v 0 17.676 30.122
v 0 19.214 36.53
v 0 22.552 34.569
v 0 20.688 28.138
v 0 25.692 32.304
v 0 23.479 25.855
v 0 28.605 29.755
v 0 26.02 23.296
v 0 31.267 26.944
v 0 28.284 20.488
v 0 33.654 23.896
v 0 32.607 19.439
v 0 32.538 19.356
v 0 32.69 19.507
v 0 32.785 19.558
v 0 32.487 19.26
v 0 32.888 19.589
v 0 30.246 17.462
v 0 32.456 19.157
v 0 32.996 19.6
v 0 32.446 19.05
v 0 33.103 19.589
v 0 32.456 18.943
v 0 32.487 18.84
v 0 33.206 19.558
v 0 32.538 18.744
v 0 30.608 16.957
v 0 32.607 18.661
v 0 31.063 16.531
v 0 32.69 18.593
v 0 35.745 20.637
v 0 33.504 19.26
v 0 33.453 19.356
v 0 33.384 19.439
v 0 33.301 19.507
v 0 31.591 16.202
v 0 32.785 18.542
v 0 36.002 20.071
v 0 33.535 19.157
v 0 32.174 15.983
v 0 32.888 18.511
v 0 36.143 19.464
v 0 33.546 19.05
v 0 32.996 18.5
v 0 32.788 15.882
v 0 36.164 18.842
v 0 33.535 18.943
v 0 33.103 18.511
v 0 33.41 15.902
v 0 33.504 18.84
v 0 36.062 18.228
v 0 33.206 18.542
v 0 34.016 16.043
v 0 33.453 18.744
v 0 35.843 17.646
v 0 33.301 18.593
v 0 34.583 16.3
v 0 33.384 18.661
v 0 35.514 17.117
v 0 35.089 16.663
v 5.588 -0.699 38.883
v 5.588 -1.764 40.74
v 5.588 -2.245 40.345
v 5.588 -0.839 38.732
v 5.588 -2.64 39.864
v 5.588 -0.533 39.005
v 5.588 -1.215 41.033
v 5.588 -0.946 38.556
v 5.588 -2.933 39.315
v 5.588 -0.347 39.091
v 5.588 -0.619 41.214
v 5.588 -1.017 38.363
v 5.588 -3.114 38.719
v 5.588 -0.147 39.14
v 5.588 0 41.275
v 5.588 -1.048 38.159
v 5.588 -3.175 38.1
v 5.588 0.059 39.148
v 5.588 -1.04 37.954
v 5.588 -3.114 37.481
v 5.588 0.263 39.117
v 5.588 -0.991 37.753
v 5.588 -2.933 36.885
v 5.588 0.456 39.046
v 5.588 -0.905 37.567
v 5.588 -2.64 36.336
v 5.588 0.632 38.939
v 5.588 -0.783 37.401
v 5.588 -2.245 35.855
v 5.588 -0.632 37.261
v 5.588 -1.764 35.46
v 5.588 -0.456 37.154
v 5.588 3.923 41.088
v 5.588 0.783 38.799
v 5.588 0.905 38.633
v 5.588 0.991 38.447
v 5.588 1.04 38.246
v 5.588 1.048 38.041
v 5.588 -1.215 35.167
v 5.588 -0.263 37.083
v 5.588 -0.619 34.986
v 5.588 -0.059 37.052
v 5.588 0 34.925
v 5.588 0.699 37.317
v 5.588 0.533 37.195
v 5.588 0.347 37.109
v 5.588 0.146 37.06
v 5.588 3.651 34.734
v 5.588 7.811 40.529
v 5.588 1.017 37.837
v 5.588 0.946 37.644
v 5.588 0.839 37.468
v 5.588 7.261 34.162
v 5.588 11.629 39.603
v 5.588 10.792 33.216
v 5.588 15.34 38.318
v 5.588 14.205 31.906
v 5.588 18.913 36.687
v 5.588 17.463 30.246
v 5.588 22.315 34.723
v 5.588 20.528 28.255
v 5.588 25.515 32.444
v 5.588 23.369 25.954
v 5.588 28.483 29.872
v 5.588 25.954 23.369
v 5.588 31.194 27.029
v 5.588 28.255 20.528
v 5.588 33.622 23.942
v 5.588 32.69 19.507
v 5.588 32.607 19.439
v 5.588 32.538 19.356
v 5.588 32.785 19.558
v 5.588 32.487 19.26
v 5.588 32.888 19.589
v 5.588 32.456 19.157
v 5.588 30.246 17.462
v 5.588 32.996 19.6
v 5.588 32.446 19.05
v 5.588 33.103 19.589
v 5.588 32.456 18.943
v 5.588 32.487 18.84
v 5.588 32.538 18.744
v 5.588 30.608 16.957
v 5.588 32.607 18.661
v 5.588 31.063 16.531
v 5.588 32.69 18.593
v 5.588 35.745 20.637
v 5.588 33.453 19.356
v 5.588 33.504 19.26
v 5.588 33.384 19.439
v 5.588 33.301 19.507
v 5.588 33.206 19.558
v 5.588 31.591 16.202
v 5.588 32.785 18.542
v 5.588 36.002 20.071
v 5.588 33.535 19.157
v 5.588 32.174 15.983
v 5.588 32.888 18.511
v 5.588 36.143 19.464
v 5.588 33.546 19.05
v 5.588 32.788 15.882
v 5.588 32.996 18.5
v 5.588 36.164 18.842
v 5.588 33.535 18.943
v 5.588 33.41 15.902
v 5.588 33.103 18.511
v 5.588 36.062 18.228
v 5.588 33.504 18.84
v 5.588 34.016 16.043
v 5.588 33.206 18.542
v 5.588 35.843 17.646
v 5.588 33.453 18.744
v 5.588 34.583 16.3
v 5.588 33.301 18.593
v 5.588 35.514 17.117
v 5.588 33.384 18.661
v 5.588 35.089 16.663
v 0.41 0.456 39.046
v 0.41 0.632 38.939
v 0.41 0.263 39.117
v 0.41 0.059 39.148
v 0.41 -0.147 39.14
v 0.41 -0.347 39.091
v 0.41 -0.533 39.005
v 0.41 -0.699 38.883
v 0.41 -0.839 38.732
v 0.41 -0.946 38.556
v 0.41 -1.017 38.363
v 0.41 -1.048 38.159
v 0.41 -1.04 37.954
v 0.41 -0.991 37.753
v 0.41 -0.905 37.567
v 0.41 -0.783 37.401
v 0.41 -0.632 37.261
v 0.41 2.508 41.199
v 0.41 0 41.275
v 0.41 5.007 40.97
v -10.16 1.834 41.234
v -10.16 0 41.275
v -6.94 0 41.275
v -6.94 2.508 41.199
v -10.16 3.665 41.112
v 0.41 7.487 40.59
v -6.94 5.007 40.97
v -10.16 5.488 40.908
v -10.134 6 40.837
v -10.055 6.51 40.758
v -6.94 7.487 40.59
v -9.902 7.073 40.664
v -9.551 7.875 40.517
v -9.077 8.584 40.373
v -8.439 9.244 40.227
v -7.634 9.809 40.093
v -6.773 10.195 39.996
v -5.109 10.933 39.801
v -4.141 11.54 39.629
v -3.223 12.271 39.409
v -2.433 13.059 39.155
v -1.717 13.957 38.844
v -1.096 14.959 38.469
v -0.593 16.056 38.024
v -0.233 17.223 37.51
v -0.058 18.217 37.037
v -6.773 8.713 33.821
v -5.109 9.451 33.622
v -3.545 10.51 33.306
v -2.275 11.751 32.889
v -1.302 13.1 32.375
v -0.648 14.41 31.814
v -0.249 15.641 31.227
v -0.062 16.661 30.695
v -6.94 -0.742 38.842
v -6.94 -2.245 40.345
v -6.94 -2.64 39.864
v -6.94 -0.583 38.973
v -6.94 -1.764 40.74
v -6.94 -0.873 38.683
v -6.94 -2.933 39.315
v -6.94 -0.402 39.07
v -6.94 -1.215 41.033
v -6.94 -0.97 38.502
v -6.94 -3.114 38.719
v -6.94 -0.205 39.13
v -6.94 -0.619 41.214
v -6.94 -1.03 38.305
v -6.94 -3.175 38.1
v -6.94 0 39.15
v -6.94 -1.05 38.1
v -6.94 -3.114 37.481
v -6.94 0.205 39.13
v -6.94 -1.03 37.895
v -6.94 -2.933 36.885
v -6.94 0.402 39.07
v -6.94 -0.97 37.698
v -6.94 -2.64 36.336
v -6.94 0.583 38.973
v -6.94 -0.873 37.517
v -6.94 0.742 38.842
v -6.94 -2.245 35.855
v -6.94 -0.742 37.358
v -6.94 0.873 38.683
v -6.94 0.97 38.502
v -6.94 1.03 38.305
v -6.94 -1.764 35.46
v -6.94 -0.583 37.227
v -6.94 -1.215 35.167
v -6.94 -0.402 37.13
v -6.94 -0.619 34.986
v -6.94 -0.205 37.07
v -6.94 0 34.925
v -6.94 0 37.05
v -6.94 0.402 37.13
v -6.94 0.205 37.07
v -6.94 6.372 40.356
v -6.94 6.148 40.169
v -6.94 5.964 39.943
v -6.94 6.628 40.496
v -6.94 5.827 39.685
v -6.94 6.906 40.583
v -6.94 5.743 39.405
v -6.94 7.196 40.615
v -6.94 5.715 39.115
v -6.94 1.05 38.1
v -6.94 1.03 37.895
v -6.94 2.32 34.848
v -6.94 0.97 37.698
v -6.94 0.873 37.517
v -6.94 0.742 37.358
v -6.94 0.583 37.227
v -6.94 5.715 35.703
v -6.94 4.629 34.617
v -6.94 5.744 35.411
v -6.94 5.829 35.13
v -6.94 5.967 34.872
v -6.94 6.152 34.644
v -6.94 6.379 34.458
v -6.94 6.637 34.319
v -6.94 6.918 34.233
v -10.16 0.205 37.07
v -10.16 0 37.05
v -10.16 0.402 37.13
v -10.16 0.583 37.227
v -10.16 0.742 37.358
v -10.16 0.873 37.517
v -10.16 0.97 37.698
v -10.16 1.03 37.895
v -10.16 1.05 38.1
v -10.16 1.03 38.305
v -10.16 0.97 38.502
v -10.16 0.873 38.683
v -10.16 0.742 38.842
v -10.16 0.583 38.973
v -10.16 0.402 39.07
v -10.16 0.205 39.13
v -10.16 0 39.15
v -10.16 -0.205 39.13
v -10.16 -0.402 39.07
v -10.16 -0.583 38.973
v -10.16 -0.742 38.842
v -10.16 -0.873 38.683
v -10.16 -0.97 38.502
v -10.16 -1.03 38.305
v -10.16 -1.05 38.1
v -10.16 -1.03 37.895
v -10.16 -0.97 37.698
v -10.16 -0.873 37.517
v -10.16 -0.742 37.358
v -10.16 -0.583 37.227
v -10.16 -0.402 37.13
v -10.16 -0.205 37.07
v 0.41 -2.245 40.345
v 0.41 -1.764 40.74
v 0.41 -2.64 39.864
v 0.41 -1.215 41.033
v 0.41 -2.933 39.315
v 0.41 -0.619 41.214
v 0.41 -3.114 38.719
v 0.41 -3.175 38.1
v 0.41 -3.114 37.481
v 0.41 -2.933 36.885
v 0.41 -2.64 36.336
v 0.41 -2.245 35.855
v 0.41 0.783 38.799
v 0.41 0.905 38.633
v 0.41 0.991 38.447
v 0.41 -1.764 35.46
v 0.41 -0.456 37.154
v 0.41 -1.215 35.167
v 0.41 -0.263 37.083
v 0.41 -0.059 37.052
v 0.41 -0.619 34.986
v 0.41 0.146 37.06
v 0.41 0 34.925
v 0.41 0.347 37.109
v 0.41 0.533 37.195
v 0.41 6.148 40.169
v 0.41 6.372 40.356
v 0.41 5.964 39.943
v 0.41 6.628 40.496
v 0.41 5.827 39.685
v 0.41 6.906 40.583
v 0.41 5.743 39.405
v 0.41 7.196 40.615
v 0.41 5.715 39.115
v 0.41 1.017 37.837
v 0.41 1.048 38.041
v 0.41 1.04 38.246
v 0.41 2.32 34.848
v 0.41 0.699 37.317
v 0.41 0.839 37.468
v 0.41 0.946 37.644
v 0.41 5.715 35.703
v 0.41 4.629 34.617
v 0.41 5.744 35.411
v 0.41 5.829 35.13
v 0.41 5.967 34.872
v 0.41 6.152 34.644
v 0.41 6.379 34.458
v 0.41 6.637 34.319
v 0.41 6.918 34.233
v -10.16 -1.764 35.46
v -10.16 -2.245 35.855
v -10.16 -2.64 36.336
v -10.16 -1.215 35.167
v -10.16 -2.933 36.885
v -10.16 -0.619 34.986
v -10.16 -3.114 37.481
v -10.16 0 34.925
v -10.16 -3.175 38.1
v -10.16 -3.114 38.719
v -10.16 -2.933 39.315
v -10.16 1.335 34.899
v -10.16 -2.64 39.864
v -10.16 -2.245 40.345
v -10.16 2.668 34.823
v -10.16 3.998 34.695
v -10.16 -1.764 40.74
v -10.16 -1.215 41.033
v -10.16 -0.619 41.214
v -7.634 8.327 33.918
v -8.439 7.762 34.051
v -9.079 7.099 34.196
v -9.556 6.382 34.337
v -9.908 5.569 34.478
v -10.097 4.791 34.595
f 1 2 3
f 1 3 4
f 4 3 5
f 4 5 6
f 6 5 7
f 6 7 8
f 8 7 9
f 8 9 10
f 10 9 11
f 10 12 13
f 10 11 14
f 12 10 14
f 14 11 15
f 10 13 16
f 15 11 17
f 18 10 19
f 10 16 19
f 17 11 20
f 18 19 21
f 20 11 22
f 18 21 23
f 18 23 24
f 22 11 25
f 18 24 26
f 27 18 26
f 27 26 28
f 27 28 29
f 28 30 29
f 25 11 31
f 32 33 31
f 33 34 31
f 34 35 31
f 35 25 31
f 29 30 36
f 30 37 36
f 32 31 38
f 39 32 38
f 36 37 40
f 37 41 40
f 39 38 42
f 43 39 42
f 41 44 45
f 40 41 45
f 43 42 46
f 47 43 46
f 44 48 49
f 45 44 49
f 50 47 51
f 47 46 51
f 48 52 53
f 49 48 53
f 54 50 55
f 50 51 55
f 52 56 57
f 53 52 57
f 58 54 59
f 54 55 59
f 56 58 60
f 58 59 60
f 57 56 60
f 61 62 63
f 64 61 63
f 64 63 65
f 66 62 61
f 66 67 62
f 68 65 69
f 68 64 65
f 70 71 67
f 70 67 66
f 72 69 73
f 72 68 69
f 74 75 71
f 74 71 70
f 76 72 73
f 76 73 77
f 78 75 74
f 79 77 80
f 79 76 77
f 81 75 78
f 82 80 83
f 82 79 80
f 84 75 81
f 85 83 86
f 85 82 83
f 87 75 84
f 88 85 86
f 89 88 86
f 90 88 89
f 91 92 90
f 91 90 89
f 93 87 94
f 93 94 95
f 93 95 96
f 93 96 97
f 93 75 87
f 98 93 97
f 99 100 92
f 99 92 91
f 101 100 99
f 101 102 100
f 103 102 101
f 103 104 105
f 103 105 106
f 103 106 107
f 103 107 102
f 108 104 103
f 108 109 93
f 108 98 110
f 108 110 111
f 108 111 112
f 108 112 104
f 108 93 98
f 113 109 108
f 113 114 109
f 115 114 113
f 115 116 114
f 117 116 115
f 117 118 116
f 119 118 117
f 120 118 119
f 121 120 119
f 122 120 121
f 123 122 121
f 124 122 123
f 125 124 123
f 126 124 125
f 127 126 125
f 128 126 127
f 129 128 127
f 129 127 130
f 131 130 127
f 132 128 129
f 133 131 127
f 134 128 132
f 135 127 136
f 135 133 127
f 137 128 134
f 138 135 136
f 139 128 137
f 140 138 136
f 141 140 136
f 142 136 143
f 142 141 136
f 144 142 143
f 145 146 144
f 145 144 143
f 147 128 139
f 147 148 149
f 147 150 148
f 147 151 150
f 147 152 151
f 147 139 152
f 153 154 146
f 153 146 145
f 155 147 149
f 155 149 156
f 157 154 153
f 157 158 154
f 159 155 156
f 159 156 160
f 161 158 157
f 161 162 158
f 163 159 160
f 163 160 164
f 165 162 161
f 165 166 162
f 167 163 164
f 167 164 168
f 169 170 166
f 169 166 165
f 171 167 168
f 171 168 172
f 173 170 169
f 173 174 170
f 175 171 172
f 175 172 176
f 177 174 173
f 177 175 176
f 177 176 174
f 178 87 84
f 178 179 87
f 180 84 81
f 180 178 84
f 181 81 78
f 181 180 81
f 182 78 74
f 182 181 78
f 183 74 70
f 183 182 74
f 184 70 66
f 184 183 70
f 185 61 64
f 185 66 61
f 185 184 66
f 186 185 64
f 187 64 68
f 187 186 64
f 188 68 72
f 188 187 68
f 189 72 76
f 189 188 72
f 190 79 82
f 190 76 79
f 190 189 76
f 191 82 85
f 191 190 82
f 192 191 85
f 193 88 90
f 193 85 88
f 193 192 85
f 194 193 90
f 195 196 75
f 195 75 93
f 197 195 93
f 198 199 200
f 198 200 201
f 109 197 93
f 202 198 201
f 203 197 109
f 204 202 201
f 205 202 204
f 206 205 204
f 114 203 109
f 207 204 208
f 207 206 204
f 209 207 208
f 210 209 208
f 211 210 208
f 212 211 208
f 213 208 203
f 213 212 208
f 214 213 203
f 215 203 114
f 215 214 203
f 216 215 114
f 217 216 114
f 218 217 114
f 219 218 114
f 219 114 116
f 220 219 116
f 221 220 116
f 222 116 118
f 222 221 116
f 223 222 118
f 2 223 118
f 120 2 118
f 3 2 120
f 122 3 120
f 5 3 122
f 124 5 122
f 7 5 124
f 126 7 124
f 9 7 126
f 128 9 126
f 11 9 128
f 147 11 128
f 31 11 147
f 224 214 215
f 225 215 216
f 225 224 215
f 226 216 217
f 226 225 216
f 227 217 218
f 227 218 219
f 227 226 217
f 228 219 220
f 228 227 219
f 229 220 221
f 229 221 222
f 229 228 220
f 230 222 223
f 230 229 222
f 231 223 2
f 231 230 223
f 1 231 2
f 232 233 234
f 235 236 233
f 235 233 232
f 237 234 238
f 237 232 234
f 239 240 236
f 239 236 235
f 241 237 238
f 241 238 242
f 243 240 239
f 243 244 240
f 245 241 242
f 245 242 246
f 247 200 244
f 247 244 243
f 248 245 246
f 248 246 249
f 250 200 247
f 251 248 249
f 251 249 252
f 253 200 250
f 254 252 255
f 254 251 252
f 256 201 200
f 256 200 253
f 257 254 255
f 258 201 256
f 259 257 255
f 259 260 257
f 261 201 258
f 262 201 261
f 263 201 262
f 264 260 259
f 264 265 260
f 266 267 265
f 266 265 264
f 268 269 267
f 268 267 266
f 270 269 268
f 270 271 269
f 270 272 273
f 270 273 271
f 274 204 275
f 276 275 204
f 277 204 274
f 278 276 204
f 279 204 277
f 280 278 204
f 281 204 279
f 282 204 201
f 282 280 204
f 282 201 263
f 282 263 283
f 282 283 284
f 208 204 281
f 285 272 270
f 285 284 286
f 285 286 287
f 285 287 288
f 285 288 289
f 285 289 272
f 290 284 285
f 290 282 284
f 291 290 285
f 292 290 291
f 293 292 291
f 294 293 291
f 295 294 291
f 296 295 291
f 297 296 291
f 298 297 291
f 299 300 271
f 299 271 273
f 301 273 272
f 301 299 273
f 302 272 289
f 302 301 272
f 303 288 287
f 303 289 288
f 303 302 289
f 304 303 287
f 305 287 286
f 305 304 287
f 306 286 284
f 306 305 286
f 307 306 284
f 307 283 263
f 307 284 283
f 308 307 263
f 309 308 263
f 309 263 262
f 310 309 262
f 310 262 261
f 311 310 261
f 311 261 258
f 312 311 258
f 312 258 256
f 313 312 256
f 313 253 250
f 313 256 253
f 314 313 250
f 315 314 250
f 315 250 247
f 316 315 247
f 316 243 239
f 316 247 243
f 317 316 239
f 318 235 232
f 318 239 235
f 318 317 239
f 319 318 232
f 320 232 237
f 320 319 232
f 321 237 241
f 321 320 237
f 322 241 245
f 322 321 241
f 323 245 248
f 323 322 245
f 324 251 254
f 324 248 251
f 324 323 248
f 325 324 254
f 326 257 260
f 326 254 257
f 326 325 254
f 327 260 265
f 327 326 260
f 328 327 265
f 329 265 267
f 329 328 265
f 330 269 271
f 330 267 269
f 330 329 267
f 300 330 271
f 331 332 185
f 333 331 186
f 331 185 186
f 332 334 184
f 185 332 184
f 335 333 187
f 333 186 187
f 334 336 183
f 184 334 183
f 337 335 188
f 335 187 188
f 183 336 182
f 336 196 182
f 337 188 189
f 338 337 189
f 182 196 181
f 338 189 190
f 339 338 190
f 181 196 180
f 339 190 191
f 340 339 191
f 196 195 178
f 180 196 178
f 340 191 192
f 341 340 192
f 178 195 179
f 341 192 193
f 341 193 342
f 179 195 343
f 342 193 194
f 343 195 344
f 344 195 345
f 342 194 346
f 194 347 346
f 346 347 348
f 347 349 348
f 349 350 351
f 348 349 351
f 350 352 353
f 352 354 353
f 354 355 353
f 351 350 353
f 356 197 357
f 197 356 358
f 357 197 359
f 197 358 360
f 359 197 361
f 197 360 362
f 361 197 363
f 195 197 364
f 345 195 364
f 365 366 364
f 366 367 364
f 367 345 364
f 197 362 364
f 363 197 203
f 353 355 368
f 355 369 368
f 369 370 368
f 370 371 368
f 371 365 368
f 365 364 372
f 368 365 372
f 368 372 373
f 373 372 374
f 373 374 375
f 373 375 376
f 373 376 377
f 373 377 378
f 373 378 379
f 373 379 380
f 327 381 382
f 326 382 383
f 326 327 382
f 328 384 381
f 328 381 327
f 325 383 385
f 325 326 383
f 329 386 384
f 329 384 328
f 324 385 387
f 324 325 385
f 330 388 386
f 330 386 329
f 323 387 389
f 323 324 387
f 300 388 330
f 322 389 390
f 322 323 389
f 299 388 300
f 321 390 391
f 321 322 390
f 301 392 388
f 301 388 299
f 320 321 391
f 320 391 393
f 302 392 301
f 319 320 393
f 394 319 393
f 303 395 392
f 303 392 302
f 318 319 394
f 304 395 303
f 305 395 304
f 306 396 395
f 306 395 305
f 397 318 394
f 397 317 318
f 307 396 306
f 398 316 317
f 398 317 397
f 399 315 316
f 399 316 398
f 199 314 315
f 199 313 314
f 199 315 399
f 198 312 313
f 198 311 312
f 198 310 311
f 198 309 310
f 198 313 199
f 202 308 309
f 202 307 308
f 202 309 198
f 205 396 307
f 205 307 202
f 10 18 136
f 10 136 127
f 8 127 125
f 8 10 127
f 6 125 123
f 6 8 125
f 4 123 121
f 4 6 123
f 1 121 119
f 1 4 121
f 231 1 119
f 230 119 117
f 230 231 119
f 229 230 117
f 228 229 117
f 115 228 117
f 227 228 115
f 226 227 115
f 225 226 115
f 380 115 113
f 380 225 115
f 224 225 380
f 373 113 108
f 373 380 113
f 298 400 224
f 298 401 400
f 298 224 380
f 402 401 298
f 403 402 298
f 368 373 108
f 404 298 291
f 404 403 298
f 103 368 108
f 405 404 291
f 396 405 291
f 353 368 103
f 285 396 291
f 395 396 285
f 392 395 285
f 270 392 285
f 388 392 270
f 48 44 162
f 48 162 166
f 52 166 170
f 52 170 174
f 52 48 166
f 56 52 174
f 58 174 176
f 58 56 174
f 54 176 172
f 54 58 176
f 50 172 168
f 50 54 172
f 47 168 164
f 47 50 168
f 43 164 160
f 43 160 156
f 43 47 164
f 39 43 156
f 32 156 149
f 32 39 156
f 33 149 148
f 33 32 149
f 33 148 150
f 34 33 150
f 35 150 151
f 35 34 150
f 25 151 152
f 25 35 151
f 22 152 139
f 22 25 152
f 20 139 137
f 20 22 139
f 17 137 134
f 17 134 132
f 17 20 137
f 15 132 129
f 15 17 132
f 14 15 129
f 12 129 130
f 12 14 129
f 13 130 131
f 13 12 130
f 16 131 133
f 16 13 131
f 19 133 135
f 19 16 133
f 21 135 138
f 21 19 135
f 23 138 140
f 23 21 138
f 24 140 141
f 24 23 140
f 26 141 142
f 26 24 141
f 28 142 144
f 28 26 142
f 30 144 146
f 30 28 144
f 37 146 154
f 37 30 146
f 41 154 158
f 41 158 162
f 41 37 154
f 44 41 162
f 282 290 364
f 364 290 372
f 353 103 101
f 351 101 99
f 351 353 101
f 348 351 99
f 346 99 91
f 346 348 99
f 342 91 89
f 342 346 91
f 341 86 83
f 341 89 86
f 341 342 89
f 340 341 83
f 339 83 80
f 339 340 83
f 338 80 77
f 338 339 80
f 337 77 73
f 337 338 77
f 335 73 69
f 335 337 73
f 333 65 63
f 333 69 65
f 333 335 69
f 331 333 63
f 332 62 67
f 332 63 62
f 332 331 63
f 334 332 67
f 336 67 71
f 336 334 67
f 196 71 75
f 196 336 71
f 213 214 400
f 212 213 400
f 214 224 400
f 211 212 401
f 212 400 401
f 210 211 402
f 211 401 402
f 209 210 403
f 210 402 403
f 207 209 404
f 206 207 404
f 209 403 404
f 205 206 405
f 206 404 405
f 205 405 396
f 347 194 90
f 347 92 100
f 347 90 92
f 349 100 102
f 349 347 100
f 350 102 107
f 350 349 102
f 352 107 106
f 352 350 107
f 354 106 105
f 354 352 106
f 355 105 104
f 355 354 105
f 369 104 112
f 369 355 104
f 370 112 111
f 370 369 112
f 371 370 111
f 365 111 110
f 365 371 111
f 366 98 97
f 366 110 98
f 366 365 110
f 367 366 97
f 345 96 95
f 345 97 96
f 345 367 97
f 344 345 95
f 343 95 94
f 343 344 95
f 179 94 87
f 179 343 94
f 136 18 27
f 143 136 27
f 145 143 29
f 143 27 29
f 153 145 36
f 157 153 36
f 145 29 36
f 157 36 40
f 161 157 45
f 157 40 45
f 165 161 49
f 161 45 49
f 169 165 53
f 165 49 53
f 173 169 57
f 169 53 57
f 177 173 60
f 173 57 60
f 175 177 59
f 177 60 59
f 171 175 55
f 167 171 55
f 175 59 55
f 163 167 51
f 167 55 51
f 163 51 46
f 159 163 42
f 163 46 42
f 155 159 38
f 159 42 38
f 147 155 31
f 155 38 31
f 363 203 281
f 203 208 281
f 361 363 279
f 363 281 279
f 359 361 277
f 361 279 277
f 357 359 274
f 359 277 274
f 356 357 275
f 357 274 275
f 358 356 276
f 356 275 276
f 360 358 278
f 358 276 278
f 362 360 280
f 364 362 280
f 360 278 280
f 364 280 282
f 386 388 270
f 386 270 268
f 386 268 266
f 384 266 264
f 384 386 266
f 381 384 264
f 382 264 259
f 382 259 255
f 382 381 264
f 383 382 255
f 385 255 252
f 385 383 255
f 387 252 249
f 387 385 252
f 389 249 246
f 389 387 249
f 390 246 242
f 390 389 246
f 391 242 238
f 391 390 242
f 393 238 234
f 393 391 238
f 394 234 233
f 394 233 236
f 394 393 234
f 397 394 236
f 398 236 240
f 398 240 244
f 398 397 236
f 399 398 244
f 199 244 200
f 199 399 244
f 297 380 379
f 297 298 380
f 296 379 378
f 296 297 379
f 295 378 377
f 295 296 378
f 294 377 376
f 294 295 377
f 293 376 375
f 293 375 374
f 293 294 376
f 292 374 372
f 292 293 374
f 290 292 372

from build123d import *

# Parameters (mm, degrees)
ESQUISSE1_R                  = 1.050000000000002
ESQUISSE1_R_2                = 0.5500000000000002
BOSS_EXTRU_1_DEPTH           = 5.588
BOSS_EXTRU_2_START           = 10.16
BOSS_EXTRU_2_DEPTH           = 10.16
ESQUISSE3_W                  = 7.349999
ESQUISSE3_H                  = 12.302264747859223
ENL_V_MAT_EXTRU_1_DEPTH      = 5.715
CONG_1_R                     = 10.16
CONG_2_R                     = 5.08
ENL_V_MAT_EXTRU_2_DEPTH      = 58.09584154270072
ENL_V_MAT_EXTRU_2_DEPTH_BACK = 58.09584154270072
ESQUISSE4_R                  = 1.050000000000002
CONG_3_R                     = 1.5


with BuildPart() as part:
    # Esquisse1 → Boss.-Extru.1 (new body)
    with BuildSketch(Plane(origin=(0, 0, 0), x_dir=(0, 0, -1), z_dir=(1, 0, 0))):
        with BuildLine():
            ThreePointArc((-34.925000000000004, 0), (-30.245937227171517, 17.462500000000013), (-17.4625, 30.245937227171524))
            ThreePointArc((-17.4625, 30.245937227171524), (-16.300369342984403, 34.583067884187116), (-20.637499999999996, 35.745198541202704))
            ThreePointArc((-20.637499999999996, 35.745198541202704), (-35.7451985412027, 20.637500000000014), (-41.275, 0))
            ThreePointArc((-41.275, 0), (-38.1, -3.174999999999997), (-34.925000000000004, 0))
        make_face()
        with Locations((-38.1, 0)):
            Circle(ESQUISSE1_R, mode=Mode.SUBTRACT)
        with Locations((-19.049999999999997, 32.99556788418712)):
            Circle(ESQUISSE1_R_2, mode=Mode.SUBTRACT)
    extrude(amount=BOSS_EXTRU_1_DEPTH)

    # Esquisse2 → Boss.-Extru.2 (add)
    with BuildSketch(Plane.ZY.offset(BOSS_EXTRU_2_START)):
        with BuildLine():
            Line((40.13567832123378, 9.630833333333326), (33.96095857950552, 8.14916666666666))
            ThreePointArc((33.96095857950552, 8.14916666666666), (34.68315227447781, 4.10299565017866), (34.925000000000004, 0))
            ThreePointArc((34.925000000000004, 0), (38.1, -3.174999999999997), (41.275, 0))
            ThreePointArc((41.275, 0), (40.9891799607465, 4.848994859302054), (40.13567832123378, 9.630833333333326))
        make_face()
    extrude(amount=-BOSS_EXTRU_2_DEPTH)

    # Esquisse3 → Enlèv. mat.-Extru.1 (cut, symmetric)
    with BuildSketch(Plane(origin=(0, 0, 0), x_dir=(1, 0, 0), z_dir=(0, 1, 0))):
        with Locations((-3.2647804999577055, -37.13499681447274)):
            Rectangle(ESQUISSE3_W, ESQUISSE3_H)
    extrude(amount=ENL_V_MAT_EXTRU_1_DEPTH, both=True, mode=Mode.SUBTRACT)

    # Congé1
    cong_1_edges = [part.edges().sort_by_distance(p)[0] for p in [
        (0, 8.889999999999993, 37.04831845036965),
    ]]
    fillet(cong_1_edges, radius=CONG_1_R - 0.0001)  # a hair under: the kernel refuses the full size

    # Congé2
    cong_2_edges = [part.edges().sort_by_distance(p)[0] for p in [
        (-10.16, 8.889999999999993, 37.04831845036965),
    ]]
    fillet(cong_2_edges, radius=CONG_2_R)

    # Esquisse4 → Enlèv. mat.-Extru.2 (cut, two sides: drawn at the far end of the back side and taken through both)
    with BuildSketch(Plane(origin=(5.588, 0, 0), x_dir=(0, 0, -1), z_dir=(1, 0, 0)).offset(-ENL_V_MAT_EXTRU_2_DEPTH_BACK)):
        with Locations(Location((-38.10000264654745, -3.51466647443e-06, 0), (0, 0, 0.000191786))):
            Circle(ESQUISSE4_R)
    extrude(amount=ENL_V_MAT_EXTRU_2_DEPTH + ENL_V_MAT_EXTRU_2_DEPTH_BACK, mode=Mode.SUBTRACT)

    # Congé3
    cong_3_edges = [part.edges().sort_by_distance(p)[0] for p in [
        (-3.2647804999577055, 5.715, 40.87743142615494),
        (-3.2647804999577055, 5.715, 34.45423631427637),
    ]]
    fillet(cong_3_edges, radius=CONG_3_R)


solid = part.part
